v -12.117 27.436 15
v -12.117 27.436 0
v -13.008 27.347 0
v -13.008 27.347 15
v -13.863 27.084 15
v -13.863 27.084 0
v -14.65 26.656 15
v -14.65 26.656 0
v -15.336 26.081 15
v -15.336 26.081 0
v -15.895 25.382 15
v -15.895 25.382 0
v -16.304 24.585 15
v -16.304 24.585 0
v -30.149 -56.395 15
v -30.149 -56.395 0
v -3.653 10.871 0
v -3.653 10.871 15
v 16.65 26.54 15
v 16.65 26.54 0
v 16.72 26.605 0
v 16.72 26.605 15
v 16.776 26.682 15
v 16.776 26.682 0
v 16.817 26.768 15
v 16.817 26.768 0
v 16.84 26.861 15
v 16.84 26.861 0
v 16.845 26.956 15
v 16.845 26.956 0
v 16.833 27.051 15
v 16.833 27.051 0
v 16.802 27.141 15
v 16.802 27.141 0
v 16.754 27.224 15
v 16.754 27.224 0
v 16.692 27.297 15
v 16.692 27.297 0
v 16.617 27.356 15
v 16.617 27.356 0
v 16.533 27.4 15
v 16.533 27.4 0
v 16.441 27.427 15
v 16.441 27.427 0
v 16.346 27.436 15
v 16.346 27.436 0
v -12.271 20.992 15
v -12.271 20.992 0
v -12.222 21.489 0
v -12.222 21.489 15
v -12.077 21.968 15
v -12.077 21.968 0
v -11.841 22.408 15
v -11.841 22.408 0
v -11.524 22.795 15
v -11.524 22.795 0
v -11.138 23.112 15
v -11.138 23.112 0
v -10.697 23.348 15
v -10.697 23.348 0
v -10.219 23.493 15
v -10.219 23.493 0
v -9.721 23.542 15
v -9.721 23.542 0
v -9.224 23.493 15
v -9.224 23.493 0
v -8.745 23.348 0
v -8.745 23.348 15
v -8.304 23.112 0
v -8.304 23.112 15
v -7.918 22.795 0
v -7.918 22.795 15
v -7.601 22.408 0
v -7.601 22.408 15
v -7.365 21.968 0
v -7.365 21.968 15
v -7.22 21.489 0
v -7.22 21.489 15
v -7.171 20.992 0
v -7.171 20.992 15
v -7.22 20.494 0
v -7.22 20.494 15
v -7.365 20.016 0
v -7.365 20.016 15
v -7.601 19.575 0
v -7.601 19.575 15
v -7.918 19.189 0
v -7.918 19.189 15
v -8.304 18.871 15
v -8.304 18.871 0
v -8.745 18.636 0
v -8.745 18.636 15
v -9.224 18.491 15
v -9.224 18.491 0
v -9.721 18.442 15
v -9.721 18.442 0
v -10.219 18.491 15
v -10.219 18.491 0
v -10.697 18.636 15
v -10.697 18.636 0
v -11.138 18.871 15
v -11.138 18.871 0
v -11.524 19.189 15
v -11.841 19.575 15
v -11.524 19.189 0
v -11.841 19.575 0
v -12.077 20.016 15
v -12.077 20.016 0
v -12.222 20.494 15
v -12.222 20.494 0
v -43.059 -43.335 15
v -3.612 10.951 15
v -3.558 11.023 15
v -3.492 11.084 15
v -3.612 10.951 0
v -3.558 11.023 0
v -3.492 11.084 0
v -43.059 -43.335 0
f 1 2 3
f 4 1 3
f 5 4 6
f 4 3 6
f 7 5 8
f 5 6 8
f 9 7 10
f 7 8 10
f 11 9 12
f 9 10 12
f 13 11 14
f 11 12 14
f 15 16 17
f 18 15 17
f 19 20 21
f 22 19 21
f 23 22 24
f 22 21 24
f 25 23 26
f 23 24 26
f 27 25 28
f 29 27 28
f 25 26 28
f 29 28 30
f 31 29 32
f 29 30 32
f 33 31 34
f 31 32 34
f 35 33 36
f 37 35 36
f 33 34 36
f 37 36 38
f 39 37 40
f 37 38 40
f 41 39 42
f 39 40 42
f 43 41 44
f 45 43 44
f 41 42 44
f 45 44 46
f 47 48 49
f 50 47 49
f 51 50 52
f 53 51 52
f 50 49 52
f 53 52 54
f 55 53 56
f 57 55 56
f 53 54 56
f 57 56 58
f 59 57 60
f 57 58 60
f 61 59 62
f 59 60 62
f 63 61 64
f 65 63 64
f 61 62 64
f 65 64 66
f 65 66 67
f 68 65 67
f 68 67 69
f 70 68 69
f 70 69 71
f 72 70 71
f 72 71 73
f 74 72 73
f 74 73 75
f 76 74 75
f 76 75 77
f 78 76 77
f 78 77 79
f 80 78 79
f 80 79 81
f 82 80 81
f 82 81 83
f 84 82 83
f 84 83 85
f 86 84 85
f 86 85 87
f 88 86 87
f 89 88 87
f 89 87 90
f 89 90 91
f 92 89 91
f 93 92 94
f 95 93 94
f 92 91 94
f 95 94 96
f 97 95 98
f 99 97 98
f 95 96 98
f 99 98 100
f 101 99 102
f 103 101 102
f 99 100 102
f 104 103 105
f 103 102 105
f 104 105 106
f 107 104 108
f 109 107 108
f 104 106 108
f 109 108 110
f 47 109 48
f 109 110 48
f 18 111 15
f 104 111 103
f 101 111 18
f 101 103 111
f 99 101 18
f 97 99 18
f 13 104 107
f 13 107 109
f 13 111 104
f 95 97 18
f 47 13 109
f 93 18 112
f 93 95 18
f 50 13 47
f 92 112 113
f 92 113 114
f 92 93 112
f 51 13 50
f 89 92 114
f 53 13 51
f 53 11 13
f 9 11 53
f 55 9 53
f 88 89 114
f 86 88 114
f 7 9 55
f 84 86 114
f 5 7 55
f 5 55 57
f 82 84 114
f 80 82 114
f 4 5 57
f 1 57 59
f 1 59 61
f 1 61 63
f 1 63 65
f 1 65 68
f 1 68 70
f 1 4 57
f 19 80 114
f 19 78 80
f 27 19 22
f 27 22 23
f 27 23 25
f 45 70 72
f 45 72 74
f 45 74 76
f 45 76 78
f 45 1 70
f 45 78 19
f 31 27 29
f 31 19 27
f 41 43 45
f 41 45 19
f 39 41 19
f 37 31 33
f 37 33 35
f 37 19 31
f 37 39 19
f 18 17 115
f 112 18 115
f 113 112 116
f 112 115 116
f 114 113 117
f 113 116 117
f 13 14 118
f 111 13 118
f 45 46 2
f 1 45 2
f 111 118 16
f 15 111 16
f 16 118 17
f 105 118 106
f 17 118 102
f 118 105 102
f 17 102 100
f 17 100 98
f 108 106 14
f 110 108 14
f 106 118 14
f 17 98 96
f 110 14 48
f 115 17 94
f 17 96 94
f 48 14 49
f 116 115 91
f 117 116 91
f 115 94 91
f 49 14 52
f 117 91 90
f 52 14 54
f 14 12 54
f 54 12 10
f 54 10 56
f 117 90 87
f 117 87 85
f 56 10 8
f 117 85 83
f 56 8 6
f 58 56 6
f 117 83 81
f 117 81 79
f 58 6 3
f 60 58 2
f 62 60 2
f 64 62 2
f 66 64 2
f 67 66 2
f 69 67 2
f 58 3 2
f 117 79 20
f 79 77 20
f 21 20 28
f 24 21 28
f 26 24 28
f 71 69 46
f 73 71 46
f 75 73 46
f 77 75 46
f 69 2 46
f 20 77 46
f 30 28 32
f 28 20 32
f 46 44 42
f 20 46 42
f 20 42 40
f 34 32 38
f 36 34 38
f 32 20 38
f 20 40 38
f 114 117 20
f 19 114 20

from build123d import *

# Parameters (mm, degrees)
F1_DEPTH = 15
F3_D     = 5.1


with BuildPart() as f1:
    # F0 (on Top) → F1 (new body)
    with BuildSketch(Plane.XY):
        with BuildLine():
            Line((16.345871, 27.436218), (-12.117236, 27.436218))
            ThreePointArc((-12.117236, 27.436218), (-14.649858, 26.655872), (-16.304115, 24.585473))
            Line((-16.304115, 24.585473), (-43.058704, -43.335009))
            Line((-43.058704, -43.335009), (-30.149364, -56.39547))
            Line((-30.149364, -56.39547), (-3.652537, 10.870645))
            ThreePointArc((-3.652537, 10.870645), (-3.586646, 10.988302), (-3.491709, 11.084071))
            Line((-3.491709, 11.084071), (16.650252, 26.539541))
            ThreePointArc((16.650252, 26.539541), (16.819336, 27.096937), (16.345871, 27.436218))
        make_face()
    extrude(amount=F1_DEPTH)

    # F3 (through all)
    with Locations(Plane.XY.offset(15)):
        with Locations((-9.721193, 20.991709)):
            Hole(F3_D / 2)


solid = f1.part
